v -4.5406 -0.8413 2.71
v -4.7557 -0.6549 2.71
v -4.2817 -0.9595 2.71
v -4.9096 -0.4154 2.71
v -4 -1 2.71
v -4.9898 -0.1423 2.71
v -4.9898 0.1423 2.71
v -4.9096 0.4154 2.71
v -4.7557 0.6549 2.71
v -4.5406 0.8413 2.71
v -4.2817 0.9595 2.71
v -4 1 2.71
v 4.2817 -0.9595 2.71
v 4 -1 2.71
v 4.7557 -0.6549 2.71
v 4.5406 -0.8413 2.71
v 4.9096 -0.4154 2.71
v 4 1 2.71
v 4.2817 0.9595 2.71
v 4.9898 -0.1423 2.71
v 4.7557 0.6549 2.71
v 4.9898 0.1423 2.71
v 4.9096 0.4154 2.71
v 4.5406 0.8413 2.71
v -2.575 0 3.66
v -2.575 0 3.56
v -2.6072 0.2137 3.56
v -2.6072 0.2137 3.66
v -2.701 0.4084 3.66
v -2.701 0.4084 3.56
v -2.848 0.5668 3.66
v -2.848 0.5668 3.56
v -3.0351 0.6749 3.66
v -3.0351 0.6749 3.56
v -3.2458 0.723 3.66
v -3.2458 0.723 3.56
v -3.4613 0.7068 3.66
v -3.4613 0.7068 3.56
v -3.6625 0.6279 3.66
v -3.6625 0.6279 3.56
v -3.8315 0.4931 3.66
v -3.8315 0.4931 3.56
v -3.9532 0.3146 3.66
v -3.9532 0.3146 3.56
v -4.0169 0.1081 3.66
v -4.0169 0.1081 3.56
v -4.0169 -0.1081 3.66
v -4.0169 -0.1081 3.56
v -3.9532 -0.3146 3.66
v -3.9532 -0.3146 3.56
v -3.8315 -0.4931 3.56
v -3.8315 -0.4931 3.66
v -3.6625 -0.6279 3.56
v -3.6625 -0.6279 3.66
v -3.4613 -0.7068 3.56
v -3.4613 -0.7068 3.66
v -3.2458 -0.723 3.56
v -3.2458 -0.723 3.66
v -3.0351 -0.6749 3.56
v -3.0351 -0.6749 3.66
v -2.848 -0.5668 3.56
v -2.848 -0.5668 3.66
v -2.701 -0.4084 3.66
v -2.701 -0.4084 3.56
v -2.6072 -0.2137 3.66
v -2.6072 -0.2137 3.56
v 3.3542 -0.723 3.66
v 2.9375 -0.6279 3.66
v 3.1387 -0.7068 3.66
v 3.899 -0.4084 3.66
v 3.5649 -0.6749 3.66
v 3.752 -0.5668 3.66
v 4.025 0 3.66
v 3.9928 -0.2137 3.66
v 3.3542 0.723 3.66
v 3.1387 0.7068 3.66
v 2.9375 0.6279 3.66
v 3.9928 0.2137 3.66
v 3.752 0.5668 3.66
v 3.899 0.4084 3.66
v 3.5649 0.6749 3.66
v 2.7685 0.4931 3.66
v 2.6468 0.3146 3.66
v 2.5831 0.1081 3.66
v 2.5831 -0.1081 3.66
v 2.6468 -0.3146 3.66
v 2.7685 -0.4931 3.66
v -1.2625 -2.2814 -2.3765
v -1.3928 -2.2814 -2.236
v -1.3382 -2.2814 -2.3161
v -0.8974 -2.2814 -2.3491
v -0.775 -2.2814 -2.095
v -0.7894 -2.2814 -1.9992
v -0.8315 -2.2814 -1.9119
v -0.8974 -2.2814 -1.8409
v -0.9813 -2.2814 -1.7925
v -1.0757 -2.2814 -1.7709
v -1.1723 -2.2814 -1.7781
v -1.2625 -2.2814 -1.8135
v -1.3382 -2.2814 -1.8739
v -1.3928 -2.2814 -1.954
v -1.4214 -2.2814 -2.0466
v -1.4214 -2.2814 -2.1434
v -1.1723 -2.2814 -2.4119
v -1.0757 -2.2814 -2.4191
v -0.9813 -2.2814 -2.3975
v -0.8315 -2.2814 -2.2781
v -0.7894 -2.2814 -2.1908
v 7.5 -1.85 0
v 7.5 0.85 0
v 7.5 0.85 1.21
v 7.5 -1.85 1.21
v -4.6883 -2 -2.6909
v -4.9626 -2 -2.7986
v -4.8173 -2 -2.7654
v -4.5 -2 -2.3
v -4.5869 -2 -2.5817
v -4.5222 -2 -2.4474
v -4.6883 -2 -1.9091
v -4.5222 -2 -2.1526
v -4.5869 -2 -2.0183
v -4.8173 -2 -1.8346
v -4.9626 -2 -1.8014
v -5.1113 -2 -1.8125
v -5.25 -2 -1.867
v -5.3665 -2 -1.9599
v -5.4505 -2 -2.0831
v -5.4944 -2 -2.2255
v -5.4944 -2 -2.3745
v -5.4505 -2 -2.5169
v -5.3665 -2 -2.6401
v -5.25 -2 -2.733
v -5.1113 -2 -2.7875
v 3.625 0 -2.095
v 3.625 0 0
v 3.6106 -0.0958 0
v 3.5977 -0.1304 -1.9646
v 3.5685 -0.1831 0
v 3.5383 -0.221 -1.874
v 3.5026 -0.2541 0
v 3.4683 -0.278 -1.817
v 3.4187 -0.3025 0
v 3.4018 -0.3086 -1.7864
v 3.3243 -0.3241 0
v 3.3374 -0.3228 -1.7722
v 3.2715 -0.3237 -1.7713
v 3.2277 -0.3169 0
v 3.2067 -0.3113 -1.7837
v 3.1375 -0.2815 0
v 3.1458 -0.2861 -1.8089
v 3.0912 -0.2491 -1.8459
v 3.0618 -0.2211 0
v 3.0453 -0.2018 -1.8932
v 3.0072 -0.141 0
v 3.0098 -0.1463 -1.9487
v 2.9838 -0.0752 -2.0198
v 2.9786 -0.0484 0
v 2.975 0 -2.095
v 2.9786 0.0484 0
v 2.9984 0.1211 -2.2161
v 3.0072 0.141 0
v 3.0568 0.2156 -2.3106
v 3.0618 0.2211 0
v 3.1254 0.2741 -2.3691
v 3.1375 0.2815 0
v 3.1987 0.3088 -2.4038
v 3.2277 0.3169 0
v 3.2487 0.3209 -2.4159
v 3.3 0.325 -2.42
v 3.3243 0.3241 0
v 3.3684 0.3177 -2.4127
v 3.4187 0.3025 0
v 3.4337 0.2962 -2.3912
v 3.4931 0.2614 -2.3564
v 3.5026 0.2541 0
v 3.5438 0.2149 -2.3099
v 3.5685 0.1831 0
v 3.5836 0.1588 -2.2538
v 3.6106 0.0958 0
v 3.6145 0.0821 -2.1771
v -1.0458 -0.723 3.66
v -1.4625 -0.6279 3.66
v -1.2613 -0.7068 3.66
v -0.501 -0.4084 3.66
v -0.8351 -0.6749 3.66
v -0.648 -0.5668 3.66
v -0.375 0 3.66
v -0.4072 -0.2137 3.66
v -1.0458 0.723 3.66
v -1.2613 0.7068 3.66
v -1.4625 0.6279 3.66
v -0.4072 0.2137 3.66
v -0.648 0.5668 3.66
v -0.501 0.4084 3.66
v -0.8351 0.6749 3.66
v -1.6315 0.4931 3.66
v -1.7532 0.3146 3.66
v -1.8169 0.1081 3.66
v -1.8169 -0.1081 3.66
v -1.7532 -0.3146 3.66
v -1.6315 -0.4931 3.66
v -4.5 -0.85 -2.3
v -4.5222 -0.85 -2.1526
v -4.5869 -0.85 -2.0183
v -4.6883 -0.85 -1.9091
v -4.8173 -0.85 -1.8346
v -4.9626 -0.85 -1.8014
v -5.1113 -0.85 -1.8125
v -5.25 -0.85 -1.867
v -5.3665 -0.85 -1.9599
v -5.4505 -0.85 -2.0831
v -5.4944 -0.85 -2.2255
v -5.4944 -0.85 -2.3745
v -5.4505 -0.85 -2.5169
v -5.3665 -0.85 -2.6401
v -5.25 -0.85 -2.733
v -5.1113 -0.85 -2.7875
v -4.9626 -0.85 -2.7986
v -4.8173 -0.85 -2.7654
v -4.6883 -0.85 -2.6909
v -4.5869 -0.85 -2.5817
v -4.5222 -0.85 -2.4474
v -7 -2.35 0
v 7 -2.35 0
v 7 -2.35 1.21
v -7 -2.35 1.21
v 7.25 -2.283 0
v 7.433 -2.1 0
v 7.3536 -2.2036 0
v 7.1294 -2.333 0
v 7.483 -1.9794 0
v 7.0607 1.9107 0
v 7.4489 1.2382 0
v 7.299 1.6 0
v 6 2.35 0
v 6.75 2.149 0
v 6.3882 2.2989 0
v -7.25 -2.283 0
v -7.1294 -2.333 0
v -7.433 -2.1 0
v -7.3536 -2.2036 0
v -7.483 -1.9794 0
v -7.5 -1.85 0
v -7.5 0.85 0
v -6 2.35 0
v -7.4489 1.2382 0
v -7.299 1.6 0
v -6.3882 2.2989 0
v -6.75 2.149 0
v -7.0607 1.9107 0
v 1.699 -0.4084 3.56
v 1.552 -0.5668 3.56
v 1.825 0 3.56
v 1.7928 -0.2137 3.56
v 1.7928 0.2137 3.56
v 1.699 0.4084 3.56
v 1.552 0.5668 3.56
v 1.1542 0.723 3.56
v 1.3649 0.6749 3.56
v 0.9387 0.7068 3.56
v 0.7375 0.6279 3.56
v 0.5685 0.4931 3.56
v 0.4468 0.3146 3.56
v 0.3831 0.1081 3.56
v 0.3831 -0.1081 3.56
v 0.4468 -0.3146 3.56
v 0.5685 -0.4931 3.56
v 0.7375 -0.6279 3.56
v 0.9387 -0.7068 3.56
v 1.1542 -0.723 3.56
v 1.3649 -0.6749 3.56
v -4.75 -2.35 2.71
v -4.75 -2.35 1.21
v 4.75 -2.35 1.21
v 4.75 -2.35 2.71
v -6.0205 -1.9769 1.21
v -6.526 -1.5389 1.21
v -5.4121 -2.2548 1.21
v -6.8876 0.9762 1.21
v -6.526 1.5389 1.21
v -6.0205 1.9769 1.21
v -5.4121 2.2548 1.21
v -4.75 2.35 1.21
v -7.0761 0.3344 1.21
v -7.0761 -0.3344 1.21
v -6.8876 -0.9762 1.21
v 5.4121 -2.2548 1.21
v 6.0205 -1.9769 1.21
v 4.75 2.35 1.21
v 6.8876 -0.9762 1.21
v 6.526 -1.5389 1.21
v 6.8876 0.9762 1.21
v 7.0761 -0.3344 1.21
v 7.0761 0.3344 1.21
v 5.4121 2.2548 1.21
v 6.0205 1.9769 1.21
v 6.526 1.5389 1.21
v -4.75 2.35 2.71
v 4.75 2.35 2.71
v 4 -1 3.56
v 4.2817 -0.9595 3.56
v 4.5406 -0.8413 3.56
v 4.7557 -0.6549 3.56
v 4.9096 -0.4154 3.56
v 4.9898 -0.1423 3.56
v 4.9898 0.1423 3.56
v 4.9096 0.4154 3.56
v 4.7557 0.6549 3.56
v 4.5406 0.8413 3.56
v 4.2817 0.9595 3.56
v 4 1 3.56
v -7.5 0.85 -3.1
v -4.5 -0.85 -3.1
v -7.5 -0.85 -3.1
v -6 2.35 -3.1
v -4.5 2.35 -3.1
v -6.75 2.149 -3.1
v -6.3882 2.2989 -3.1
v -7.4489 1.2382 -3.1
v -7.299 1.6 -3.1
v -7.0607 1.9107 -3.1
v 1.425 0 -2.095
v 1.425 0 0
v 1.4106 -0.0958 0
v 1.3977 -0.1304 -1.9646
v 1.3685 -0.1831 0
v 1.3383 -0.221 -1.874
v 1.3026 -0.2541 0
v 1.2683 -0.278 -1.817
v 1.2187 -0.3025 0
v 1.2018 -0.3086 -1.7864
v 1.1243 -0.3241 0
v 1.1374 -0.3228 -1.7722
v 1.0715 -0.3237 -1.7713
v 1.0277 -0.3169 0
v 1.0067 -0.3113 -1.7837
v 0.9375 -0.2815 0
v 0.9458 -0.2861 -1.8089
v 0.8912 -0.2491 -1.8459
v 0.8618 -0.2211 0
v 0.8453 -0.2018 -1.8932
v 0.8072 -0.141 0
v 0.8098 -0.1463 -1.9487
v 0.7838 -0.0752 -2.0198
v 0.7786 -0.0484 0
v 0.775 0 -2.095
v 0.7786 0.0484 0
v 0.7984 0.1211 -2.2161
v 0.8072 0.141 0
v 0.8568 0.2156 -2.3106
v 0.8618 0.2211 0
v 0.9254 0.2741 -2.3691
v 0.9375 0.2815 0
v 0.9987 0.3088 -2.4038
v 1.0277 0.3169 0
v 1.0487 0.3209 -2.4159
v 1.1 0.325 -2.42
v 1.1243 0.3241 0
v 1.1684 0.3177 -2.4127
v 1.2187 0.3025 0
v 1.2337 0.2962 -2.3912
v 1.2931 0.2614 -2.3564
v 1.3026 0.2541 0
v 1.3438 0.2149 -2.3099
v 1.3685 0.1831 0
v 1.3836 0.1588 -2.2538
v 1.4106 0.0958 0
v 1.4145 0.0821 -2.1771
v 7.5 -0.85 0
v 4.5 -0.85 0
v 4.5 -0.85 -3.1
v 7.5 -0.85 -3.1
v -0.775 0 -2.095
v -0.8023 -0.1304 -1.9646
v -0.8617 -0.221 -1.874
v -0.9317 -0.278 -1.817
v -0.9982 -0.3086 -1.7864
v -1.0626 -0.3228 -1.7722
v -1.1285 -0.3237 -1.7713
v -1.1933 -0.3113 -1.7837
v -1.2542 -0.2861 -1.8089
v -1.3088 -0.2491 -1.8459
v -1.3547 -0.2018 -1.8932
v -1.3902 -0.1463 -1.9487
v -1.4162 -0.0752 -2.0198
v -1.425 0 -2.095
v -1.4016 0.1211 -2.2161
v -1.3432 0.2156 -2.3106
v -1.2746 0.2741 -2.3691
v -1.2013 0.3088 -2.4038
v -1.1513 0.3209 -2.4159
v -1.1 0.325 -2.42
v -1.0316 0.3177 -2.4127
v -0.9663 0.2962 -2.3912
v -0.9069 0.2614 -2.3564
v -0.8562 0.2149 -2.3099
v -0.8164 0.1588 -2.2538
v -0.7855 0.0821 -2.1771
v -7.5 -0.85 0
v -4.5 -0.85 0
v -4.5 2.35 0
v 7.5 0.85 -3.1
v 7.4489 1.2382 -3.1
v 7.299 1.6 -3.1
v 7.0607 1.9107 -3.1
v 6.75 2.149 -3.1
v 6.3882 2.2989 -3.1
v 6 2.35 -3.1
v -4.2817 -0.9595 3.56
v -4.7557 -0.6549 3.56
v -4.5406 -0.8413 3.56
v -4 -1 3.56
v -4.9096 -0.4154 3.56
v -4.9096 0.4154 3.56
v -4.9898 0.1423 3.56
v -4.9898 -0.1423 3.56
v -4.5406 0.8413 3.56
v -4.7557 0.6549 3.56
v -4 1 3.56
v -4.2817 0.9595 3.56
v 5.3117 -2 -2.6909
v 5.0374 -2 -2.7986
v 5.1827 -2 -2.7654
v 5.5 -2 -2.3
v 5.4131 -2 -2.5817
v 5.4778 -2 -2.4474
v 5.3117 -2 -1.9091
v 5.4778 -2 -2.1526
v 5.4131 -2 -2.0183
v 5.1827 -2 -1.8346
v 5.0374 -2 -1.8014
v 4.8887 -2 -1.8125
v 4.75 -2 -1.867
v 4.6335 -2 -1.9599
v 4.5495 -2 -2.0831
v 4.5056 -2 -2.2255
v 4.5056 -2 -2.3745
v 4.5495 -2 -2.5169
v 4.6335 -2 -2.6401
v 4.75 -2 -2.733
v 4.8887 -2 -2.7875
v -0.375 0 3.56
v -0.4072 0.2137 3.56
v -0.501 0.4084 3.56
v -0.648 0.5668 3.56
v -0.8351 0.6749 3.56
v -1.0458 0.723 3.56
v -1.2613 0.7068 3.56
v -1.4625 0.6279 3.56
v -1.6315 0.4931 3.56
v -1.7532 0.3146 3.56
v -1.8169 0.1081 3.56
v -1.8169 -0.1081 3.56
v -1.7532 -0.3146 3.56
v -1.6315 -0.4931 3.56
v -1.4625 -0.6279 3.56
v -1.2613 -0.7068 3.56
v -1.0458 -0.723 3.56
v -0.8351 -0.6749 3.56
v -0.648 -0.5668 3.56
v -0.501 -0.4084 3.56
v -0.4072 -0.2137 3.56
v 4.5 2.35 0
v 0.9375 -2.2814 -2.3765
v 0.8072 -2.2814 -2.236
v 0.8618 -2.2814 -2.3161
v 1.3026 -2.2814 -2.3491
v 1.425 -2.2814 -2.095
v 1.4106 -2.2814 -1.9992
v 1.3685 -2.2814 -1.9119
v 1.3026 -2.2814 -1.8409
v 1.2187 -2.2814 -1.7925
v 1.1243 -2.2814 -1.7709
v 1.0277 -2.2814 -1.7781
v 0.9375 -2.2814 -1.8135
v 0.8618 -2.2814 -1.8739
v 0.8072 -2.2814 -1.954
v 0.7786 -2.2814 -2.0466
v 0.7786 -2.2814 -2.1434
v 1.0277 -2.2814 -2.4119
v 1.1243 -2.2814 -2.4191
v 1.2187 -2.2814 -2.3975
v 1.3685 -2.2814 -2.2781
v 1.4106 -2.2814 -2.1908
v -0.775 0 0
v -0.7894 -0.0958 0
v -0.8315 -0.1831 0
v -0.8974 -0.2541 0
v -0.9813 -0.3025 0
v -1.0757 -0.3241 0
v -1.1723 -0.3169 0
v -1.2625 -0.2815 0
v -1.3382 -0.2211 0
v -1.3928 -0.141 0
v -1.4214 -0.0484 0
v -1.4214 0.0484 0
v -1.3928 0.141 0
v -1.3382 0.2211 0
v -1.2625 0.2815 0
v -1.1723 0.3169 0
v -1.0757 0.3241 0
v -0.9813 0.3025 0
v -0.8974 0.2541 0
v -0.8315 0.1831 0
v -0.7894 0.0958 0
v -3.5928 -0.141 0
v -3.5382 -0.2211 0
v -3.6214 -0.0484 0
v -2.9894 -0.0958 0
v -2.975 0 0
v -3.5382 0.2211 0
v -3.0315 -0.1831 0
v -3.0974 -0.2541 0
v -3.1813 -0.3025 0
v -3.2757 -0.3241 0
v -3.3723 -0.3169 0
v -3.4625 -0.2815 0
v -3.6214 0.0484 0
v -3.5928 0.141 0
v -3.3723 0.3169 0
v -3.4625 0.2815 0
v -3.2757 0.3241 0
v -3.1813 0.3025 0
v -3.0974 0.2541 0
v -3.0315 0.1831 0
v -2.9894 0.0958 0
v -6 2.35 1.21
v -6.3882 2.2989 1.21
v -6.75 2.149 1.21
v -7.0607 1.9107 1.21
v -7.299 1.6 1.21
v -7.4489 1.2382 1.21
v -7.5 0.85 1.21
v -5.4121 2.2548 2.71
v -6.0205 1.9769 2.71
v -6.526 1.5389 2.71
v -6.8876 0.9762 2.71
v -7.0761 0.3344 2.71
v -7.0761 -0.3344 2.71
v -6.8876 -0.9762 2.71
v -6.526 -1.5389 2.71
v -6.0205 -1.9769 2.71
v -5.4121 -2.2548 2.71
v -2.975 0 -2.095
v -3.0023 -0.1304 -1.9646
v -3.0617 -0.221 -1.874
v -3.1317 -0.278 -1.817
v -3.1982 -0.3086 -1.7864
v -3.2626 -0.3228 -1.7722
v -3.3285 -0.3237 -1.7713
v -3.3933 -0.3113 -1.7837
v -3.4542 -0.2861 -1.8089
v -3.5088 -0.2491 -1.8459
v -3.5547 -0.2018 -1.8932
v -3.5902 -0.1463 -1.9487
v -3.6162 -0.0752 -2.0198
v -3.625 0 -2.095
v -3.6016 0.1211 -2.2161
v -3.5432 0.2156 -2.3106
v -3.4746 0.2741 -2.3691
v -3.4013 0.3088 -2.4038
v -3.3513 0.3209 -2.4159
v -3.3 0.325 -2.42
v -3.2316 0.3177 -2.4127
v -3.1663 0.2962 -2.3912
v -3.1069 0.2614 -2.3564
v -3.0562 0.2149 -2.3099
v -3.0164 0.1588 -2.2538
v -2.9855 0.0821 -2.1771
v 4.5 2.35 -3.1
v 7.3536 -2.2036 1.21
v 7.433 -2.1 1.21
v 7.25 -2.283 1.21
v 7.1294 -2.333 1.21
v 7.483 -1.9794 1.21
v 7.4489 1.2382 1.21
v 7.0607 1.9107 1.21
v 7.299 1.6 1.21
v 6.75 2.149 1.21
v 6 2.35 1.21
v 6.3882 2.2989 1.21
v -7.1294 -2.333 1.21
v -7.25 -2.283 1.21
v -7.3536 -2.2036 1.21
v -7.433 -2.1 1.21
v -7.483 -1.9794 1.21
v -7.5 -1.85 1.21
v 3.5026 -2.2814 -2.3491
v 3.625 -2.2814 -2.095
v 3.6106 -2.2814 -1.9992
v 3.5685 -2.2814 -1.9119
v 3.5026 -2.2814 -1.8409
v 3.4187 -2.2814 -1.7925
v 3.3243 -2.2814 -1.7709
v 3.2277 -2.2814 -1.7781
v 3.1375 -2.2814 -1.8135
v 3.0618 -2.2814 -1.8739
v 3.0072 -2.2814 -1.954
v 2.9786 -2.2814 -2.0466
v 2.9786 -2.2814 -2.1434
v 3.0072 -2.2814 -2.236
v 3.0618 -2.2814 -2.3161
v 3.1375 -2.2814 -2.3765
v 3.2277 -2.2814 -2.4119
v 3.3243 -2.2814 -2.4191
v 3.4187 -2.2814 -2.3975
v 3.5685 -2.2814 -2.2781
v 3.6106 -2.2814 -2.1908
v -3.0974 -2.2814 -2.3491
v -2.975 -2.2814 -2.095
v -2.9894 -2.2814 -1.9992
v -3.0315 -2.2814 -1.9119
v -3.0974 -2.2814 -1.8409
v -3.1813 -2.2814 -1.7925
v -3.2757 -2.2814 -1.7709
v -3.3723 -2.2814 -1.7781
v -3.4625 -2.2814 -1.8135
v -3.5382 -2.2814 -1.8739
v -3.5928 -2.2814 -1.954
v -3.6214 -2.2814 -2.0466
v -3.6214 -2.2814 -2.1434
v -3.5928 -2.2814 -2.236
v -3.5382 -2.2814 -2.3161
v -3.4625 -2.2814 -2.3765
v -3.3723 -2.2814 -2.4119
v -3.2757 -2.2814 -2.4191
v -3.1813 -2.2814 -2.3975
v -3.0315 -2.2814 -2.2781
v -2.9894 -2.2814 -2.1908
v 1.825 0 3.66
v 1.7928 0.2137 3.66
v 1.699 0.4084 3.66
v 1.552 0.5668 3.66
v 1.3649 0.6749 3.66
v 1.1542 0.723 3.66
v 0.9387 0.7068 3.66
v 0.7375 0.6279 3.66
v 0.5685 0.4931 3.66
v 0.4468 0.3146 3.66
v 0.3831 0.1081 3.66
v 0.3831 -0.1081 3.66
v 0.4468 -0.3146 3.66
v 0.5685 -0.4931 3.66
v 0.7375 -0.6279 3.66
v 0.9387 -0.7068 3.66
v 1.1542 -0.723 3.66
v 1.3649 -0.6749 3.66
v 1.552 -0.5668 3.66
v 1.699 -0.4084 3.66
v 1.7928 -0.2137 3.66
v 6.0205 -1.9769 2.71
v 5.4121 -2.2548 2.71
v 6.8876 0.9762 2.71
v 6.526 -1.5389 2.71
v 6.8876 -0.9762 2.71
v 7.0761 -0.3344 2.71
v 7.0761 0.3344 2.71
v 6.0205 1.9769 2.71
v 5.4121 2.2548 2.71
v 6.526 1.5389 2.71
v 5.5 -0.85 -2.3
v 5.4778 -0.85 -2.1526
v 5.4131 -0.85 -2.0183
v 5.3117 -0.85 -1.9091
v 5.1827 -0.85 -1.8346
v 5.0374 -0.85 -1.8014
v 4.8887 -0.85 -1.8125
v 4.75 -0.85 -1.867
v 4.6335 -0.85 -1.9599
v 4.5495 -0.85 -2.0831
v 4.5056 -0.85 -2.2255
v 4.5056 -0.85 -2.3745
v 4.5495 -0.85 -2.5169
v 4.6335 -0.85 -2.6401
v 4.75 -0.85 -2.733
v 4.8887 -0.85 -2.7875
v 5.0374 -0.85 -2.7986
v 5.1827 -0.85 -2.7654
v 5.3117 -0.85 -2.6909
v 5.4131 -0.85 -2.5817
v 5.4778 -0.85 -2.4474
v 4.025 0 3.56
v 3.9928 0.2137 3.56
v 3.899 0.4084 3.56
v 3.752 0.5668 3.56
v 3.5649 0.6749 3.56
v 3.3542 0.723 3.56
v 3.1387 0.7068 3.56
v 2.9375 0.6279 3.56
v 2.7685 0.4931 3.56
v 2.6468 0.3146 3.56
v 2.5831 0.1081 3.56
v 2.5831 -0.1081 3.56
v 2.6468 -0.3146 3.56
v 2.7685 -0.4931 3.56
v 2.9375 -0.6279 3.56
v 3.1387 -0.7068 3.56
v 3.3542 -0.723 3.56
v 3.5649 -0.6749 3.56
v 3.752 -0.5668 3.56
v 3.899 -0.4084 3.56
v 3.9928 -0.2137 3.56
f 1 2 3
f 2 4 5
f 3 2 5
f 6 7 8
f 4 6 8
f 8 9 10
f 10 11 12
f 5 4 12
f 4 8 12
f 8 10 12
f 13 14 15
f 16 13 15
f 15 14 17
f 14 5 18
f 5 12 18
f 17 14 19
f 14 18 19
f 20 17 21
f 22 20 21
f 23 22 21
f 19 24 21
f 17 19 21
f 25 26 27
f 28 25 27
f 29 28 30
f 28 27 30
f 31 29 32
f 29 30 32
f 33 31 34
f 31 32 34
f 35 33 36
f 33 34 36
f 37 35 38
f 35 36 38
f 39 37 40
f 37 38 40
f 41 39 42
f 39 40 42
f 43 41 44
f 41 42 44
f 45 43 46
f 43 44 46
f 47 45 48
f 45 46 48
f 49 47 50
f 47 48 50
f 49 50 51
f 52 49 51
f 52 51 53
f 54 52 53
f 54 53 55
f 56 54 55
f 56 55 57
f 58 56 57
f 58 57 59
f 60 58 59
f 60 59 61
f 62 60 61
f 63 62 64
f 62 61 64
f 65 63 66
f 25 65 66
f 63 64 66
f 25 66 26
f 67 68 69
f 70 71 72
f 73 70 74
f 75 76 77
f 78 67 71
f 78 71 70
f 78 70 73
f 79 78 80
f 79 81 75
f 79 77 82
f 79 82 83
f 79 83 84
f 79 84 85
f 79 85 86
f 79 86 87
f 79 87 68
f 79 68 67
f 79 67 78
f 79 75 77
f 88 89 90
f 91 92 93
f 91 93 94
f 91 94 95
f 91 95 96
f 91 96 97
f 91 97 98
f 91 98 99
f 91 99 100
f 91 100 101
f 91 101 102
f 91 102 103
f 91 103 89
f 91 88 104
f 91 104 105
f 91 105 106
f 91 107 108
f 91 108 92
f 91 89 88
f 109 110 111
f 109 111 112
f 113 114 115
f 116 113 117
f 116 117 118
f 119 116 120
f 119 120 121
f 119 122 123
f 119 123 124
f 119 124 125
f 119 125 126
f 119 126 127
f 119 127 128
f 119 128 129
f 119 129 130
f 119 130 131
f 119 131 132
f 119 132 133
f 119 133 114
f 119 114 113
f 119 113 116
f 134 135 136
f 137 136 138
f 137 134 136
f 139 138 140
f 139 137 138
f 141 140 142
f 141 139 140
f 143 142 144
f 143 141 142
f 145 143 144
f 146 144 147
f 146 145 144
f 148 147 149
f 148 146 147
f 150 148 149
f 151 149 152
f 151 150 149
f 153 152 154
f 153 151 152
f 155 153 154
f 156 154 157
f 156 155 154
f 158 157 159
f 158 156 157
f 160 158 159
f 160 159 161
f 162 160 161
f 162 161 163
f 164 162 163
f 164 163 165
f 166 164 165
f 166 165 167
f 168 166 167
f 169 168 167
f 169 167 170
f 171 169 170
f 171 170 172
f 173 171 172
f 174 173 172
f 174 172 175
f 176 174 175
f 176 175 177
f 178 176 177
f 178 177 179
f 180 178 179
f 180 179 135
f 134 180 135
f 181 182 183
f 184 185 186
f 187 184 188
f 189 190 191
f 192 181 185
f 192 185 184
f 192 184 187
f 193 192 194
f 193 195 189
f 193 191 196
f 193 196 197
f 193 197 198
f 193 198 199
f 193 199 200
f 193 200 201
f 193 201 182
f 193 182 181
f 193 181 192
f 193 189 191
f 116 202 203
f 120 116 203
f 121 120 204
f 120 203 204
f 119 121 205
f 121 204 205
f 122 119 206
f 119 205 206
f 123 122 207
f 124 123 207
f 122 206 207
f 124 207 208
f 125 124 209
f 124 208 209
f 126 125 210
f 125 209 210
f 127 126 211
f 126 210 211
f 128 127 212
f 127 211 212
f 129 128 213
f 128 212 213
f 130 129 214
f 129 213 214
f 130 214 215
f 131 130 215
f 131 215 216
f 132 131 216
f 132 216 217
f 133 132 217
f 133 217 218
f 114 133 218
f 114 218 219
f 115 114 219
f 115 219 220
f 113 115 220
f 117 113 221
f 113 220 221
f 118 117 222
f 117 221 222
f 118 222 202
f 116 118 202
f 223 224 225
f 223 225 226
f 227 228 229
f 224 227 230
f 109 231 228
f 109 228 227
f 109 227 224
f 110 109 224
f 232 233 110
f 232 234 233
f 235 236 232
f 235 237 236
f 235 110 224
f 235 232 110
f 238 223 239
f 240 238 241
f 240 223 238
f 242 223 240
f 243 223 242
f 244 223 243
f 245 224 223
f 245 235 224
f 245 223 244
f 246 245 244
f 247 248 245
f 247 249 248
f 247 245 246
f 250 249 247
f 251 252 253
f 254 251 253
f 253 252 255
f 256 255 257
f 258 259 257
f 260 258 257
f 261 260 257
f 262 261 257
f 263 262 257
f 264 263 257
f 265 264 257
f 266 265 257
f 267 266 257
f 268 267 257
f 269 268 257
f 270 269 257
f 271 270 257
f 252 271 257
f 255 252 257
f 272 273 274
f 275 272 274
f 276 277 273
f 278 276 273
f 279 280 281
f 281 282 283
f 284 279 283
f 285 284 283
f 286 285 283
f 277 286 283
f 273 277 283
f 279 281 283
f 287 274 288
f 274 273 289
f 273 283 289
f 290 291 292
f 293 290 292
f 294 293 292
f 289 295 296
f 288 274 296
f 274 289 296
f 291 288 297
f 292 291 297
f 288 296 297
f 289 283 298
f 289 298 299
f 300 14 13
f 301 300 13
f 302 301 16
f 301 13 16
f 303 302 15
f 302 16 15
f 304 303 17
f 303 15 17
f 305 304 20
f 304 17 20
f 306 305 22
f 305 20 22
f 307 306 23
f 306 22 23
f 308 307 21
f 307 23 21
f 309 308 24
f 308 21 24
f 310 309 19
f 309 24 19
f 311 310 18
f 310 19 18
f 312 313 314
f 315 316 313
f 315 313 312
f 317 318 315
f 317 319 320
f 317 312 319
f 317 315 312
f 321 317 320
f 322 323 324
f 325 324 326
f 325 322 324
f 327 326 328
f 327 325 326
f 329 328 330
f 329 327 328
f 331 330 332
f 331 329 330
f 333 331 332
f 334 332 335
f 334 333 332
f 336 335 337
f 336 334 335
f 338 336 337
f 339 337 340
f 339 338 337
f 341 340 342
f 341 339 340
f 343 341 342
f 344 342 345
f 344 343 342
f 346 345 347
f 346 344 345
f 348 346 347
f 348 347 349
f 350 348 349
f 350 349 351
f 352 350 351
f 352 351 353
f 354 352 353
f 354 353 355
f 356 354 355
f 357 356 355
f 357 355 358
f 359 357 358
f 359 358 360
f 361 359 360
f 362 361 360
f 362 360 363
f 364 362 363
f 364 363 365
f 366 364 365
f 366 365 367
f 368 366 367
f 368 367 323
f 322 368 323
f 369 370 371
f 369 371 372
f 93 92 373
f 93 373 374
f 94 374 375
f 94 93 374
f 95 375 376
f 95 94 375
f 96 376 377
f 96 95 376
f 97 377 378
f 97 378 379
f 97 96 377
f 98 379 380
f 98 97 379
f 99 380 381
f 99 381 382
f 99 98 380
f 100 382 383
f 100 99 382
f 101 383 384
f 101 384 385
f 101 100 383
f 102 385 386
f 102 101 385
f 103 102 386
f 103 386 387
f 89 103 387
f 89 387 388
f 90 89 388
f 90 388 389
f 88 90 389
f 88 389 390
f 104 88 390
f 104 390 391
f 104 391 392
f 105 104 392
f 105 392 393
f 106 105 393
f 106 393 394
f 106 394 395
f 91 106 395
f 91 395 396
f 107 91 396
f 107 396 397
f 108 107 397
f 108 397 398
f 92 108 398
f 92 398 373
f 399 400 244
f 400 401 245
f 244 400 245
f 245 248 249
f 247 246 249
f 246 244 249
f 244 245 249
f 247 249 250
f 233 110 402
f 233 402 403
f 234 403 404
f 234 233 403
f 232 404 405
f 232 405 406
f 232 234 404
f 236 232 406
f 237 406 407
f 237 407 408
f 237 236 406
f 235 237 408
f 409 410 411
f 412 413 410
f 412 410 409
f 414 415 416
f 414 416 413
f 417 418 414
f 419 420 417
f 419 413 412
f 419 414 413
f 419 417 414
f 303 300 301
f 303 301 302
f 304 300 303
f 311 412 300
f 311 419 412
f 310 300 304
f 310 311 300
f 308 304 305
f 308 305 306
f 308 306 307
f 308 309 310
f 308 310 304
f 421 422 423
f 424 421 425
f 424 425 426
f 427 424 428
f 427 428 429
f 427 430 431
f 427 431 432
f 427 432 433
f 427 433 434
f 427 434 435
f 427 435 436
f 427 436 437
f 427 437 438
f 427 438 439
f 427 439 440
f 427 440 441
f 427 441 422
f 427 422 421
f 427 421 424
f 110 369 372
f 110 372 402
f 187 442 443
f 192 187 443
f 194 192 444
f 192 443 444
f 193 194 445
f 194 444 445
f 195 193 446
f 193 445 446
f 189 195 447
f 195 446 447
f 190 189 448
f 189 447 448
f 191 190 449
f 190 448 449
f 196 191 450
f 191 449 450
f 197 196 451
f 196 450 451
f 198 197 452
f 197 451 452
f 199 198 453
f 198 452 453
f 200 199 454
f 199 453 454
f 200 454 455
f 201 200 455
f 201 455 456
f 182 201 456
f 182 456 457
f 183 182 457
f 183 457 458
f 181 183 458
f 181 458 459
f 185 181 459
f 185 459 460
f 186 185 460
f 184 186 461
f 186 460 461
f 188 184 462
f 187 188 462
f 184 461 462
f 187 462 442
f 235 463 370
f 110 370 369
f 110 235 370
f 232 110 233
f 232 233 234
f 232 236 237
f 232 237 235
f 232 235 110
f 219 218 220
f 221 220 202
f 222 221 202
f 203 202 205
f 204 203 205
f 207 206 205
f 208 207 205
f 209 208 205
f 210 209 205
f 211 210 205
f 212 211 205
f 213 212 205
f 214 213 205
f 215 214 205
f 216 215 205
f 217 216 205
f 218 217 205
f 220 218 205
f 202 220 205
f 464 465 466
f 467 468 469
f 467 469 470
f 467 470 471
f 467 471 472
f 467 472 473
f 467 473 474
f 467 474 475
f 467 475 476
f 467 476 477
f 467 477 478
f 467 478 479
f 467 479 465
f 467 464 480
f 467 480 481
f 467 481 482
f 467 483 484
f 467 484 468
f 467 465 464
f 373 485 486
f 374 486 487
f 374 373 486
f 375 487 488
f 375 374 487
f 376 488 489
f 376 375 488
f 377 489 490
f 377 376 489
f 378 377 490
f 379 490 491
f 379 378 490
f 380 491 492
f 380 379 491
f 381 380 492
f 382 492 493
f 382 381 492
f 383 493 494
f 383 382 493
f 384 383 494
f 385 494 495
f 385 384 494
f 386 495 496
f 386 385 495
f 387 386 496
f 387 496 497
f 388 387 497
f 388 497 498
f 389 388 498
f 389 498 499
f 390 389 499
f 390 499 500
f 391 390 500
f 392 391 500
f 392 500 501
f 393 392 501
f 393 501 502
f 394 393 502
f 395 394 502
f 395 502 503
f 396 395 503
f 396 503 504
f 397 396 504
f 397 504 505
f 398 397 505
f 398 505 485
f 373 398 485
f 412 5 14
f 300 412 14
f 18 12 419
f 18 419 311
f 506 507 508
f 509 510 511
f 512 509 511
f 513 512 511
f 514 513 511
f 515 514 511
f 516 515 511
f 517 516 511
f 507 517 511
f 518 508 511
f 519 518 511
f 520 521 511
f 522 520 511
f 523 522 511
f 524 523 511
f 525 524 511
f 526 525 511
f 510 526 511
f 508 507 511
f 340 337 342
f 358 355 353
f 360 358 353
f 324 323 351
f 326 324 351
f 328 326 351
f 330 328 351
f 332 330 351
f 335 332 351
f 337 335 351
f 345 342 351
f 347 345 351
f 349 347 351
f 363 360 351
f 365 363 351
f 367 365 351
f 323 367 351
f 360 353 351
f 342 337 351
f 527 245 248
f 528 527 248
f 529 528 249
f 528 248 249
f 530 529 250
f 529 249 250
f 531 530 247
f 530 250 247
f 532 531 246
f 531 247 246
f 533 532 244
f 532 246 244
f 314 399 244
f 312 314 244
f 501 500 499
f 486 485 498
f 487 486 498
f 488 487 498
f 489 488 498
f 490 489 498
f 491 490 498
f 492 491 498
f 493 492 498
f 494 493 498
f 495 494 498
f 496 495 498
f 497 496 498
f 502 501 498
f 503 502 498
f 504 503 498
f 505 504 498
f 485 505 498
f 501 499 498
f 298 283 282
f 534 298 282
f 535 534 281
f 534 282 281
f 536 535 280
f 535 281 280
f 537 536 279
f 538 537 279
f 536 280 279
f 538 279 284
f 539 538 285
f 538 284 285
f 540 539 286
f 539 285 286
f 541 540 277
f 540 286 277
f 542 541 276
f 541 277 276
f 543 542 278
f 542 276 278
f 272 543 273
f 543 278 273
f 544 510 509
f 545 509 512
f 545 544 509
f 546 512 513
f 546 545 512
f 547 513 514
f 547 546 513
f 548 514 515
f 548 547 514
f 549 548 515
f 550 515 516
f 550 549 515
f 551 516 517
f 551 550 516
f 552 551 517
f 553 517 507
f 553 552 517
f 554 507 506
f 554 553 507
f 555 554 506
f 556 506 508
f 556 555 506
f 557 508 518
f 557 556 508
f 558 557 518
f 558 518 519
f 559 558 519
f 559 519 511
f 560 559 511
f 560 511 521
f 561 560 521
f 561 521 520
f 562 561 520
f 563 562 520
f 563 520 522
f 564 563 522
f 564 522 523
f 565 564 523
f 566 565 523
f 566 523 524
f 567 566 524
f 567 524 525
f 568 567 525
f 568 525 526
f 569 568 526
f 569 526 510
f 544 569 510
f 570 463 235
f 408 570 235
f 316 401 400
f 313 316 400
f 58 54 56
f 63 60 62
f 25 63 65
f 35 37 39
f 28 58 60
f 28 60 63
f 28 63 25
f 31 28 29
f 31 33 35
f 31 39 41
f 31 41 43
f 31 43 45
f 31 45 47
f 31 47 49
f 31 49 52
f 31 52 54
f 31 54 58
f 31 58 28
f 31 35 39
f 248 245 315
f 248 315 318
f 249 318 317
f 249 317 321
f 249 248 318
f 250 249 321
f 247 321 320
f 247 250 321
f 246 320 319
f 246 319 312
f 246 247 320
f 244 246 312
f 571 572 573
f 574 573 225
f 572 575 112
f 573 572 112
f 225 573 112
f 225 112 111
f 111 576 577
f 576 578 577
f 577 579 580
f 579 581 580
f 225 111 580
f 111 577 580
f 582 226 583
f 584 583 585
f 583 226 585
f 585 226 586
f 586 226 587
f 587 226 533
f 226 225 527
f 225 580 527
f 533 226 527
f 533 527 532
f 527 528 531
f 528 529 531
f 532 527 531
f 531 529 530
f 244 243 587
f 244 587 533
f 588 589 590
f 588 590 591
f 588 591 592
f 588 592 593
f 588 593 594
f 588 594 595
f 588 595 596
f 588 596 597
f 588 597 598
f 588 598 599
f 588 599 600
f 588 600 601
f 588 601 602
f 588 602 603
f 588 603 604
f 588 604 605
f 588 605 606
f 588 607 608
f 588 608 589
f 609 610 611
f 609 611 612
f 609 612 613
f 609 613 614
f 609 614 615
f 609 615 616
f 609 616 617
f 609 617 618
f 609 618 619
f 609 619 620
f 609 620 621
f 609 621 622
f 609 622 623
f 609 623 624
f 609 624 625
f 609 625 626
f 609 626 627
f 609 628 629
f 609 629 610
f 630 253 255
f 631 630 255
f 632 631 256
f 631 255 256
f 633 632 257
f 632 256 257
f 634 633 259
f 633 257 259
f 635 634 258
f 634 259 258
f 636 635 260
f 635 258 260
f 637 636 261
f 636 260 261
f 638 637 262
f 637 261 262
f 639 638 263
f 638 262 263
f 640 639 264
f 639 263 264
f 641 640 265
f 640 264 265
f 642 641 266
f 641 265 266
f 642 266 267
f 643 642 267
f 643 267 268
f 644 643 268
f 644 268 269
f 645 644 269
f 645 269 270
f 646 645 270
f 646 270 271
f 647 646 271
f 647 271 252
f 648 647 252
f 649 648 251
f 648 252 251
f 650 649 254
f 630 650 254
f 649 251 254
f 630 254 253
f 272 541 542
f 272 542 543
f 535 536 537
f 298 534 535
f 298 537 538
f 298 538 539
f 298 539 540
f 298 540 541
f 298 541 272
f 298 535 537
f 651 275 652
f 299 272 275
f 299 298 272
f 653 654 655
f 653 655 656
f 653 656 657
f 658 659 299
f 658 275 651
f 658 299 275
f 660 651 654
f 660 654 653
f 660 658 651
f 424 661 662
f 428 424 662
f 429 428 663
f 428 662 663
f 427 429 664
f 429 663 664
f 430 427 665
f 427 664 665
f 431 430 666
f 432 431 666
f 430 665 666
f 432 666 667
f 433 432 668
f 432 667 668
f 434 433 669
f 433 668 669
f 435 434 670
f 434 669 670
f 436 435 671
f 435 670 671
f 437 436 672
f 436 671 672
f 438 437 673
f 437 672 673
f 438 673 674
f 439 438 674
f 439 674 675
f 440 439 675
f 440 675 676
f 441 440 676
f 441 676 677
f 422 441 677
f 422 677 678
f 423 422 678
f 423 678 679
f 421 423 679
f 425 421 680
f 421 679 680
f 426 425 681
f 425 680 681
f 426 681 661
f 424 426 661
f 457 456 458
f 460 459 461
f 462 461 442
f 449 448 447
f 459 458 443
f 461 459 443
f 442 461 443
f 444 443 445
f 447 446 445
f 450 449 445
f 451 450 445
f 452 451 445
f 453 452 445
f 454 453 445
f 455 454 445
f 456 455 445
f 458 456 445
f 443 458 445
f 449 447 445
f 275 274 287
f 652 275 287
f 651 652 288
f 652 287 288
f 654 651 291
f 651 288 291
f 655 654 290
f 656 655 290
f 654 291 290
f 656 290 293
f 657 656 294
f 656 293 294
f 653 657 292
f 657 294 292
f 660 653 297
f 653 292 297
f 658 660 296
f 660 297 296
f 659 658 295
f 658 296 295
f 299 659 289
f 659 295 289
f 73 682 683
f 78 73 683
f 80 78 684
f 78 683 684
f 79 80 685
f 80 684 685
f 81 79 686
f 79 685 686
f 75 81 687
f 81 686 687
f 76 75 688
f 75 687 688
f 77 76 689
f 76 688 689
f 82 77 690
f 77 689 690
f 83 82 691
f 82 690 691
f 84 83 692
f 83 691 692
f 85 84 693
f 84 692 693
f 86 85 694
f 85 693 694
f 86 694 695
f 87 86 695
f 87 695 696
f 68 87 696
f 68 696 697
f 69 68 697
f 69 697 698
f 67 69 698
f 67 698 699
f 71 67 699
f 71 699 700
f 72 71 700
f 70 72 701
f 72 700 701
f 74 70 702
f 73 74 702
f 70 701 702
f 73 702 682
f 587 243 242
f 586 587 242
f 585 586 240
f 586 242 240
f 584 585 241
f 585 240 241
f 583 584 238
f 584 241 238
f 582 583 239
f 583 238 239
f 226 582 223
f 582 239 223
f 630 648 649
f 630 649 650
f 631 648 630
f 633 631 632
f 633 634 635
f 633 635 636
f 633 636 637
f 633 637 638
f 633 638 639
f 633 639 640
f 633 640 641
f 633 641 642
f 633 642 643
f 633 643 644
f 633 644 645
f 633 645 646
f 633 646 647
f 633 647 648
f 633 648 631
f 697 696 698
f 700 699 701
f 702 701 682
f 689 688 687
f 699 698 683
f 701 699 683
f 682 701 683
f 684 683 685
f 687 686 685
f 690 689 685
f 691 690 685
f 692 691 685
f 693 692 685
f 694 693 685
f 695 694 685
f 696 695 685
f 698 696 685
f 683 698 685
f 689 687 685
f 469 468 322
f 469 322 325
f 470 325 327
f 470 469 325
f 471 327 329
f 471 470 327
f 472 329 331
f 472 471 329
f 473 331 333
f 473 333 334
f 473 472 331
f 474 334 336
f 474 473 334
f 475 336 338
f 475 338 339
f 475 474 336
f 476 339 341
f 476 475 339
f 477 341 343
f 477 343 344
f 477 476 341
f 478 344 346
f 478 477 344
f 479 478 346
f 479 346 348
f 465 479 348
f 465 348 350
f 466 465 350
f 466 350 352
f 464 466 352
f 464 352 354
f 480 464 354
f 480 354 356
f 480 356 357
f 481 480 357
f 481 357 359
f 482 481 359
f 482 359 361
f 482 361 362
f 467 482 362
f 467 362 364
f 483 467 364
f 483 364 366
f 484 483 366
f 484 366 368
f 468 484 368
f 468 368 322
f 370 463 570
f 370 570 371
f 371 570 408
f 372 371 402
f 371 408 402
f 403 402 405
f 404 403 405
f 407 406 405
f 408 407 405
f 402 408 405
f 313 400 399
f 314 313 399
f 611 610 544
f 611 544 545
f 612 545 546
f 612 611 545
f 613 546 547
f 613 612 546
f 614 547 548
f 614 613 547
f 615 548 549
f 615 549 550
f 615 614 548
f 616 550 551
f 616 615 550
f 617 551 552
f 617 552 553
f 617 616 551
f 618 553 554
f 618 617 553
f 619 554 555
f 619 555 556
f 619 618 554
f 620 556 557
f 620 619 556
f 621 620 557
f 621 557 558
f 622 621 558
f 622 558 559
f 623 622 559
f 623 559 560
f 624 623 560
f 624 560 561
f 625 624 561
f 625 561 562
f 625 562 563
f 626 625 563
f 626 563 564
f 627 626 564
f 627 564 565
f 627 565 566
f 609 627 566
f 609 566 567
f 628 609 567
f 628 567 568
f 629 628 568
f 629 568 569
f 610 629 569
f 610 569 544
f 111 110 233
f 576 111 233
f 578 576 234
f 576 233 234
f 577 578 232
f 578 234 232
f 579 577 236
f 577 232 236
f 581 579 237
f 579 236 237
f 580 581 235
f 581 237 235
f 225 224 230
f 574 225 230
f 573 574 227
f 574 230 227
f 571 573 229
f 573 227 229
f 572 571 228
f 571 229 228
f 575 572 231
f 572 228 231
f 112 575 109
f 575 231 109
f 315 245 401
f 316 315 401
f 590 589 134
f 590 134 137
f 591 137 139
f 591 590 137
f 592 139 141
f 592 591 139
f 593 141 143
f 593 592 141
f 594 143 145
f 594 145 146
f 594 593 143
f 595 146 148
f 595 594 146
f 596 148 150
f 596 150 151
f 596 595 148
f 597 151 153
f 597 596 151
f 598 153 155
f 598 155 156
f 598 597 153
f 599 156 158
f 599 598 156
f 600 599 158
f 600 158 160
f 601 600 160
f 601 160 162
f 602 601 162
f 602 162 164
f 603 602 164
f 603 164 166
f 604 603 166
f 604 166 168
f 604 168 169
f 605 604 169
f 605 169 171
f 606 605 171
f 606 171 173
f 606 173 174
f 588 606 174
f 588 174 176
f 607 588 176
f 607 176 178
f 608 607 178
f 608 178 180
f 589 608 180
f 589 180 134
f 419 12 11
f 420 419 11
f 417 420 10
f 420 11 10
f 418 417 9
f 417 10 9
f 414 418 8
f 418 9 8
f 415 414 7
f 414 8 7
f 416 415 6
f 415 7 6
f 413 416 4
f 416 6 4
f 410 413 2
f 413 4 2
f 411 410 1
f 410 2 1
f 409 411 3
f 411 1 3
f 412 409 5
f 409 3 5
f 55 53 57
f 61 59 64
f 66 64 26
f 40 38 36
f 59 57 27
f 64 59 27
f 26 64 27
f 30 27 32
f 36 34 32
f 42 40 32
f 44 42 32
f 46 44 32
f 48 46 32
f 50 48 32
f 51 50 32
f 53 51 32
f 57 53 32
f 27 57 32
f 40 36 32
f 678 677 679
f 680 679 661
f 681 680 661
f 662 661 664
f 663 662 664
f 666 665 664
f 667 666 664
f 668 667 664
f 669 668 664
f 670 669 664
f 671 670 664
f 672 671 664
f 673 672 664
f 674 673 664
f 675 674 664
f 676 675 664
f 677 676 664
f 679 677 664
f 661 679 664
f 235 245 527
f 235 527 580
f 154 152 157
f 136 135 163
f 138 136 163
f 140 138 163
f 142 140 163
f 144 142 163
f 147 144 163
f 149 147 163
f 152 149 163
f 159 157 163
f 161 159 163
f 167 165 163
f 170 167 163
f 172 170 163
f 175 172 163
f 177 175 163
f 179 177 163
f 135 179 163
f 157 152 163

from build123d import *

# Parameters (mm, degrees)
EXTRUDE_DEPTH    = 1.21
EXTRUDE001_DEPTH = 1.5
EXTRUDE002_DEPTH = 0.85
SKETCH002_R      = 0.725
EXTRUDE003_DEPTH = 0.1
EXTRUDE004_DEPTH = 3.1
SKETCH005_R      = 0.5
EXTRUDE005_DEPTH = 1.15
SKETCH009_R      = 0.325
SKETCH010_R      = 0.325
SKETCH012_R      = 0.325
SKETCH011_R      = 0.325


with BuildPart() as f_2_ext:
    # Sketch001 → Extrude (new body)
    with BuildSketch(Plane.XY):
        with BuildLine():
            Line((7, -2.35), (-7, -2.35))
            ThreePointArc((-7.5, -1.85), (-7.353553, -2.203553), (-7, -2.35))
            Line((-7.5, -1.85), (-7.5, 0.85))
            ThreePointArc((-6, 2.35), (-7.06066, 1.91066), (-7.5, 0.85))
            Line((-6, 2.35), (6, 2.35))
            ThreePointArc((7.5, 0.85), (7.06066, 1.91066), (6, 2.35))
            Line((7.5, 0.85), (7.5, -1.85))
            ThreePointArc((7, -2.35), (7.353553, -2.203553), (7.5, -1.85))
        make_face()
    extrude(amount=EXTRUDE_DEPTH)


with BuildPart() as f_1_ext:
    # Sketch (on Face10 of Extrude) → Extrude001 (new body)
    with BuildSketch(Plane.XY.offset(1.21)):
        with BuildLine():
            ThreePointArc((-4.75, 2.35), (-7.1, 0), (-4.75, -2.35))
            Line((-4.75, -2.35), (4.75, -2.35))
            ThreePointArc((4.75, -2.35), (7.1, 0), (4.75, 2.35))
            Line((-4.75, 2.35), (4.75, 2.35))
        make_face()
    extrude(amount=EXTRUDE001_DEPTH)


with BuildPart() as f_0_ext:
    # Sketch003 (on Face6 of Extrude001) → Extrude002 (new body)
    with BuildSketch(Plane.XY.offset(2.71)):
        with BuildLine():
            ThreePointArc((-4, 1), (-5, 0), (-4, -1))
            Line((-4, -1), (4, -1))
            ThreePointArc((4, -1), (5, 0), (4, 1))
            Line((-4, 1), (4, 1))
        make_face()
    extrude(amount=EXTRUDE002_DEPTH)


with BuildPart() as copper_ext:
    # Sketch002 (on Face6 of Extrude002) → Extrude003 (new body)
    with BuildSketch(Plane.XY.offset(3.56)):
        with Locations((-3.3, 0)):
            Circle(SKETCH002_R)
        with Locations((-1.1, 0)):
            Circle(SKETCH002_R)
        with Locations((1.1, 0)):
            Circle(SKETCH002_R)
        with Locations((3.3, 0)):
            Circle(SKETCH002_R)
    extrude(amount=EXTRUDE003_DEPTH)


with BuildPart() as f_3_ext:
    # Sketch004 → Extrude004 (new body)
    with BuildSketch(Plane.XY):
        with BuildLine():
            Line((-4.5, 2.35), (-4.5, -0.85))
            Line((-4.5, -0.85), (-7.5, -0.85))
            Line((-7.5, -0.85), (-7.5, 0.85))
            ThreePointArc((-6, 2.35), (-7.06066, 1.91066), (-7.5, 0.85))
            Line((-6, 2.35), (-4.5, 2.35))
        make_face()
        with BuildLine():
            Line((4.5, 2.35), (4.5, -0.85))
            Line((4.5, -0.85), (7.5, -0.85))
            Line((7.5, -0.85), (7.5, 0.85))
            ThreePointArc((7.5, 0.85), (7.06066, 1.91066), (6, 2.35))
            Line((4.5, 2.35), (6, 2.35))
        make_face()
    extrude(amount=-EXTRUDE004_DEPTH)


with BuildPart() as boss_ext:
    # Sketch005 (on Face3 of Extrude004) → Extrude005 (new body)
    with BuildSketch(Plane.XZ.offset(0.85)):
        with Locations((-5, -2.3)):
            Circle(SKETCH005_R)
        with Locations((5, -2.3)):
            Circle(SKETCH005_R)
    extrude(amount=EXTRUDE005_DEPTH)


with BuildPart() as pin1_sweep:
    # Sweep: sweep along a path in Sketch008
    with BuildLine(Plane.YZ) as sweep_path:
        Line((0, 0), (0, -2.095))
        Line((0, -2.095), (-2.281354, -2.095))
    # Sketch009 (on Face9 of Extrude) → Sweep (sweep)
    with BuildSketch(Plane(origin=(0, 0, 0), x_dir=(1, 0, 0), z_dir=(0, 0, -1))):
        with Locations((3.3, 0)):
            Circle(SKETCH009_R)
    sweep(path=sweep_path.line, transition=Transition.RIGHT)


with BuildPart() as pin2_sweep:
    # Sweep001: sweep along a path in Sketch008
    with BuildLine(Plane.YZ) as sweep001_path:
        Line((0, 0), (0, -2.095))
        Line((0, -2.095), (-2.281354, -2.095))
    # Sketch010 (on Face9 of Extrude) → Sweep001 (sweep)
    with BuildSketch(Plane(origin=(0, 0, 0), x_dir=(1, 0, 0), z_dir=(0, 0, -1))):
        with Locations((1.1, 0)):
            Circle(SKETCH010_R)
    sweep(path=sweep001_path.line, transition=Transition.RIGHT)


with BuildPart() as pin4_sweep:
    # Sweep002: sweep along a path in Sketch008
    with BuildLine(Plane.YZ) as sweep002_path:
        Line((0, 0), (0, -2.095))
        Line((0, -2.095), (-2.281354, -2.095))
    # Sketch012 (on Face9 of Extrude) → Sweep002 (sweep)
    with BuildSketch(Plane(origin=(0, 0, 0), x_dir=(1, 0, 0), z_dir=(0, 0, -1))):
        with Locations((-3.3, 0)):
            Circle(SKETCH012_R)
    sweep(path=sweep002_path.line, transition=Transition.RIGHT)


with BuildPart() as pin3_sweep:
    # Sweep003: sweep along a path in Sketch008
    with BuildLine(Plane.YZ) as sweep003_path:
        Line((0, 0), (0, -2.095))
        Line((0, -2.095), (-2.281354, -2.095))
    # Sketch011 (on Face9 of Extrude) → Sweep003 (sweep)
    with BuildSketch(Plane(origin=(0, 0, 0), x_dir=(1, 0, 0), z_dir=(0, 0, -1))):
        with Locations((-1.1, 0)):
            Circle(SKETCH011_R)
    sweep(path=sweep003_path.line, transition=Transition.RIGHT)


solid = Compound([f_2_ext.part, f_1_ext.part, f_0_ext.part, copper_ext.part, f_3_ext.part, boss_ext.part, pin1_sweep.part, pin2_sweep.part, pin4_sweep.part, pin3_sweep.part])
